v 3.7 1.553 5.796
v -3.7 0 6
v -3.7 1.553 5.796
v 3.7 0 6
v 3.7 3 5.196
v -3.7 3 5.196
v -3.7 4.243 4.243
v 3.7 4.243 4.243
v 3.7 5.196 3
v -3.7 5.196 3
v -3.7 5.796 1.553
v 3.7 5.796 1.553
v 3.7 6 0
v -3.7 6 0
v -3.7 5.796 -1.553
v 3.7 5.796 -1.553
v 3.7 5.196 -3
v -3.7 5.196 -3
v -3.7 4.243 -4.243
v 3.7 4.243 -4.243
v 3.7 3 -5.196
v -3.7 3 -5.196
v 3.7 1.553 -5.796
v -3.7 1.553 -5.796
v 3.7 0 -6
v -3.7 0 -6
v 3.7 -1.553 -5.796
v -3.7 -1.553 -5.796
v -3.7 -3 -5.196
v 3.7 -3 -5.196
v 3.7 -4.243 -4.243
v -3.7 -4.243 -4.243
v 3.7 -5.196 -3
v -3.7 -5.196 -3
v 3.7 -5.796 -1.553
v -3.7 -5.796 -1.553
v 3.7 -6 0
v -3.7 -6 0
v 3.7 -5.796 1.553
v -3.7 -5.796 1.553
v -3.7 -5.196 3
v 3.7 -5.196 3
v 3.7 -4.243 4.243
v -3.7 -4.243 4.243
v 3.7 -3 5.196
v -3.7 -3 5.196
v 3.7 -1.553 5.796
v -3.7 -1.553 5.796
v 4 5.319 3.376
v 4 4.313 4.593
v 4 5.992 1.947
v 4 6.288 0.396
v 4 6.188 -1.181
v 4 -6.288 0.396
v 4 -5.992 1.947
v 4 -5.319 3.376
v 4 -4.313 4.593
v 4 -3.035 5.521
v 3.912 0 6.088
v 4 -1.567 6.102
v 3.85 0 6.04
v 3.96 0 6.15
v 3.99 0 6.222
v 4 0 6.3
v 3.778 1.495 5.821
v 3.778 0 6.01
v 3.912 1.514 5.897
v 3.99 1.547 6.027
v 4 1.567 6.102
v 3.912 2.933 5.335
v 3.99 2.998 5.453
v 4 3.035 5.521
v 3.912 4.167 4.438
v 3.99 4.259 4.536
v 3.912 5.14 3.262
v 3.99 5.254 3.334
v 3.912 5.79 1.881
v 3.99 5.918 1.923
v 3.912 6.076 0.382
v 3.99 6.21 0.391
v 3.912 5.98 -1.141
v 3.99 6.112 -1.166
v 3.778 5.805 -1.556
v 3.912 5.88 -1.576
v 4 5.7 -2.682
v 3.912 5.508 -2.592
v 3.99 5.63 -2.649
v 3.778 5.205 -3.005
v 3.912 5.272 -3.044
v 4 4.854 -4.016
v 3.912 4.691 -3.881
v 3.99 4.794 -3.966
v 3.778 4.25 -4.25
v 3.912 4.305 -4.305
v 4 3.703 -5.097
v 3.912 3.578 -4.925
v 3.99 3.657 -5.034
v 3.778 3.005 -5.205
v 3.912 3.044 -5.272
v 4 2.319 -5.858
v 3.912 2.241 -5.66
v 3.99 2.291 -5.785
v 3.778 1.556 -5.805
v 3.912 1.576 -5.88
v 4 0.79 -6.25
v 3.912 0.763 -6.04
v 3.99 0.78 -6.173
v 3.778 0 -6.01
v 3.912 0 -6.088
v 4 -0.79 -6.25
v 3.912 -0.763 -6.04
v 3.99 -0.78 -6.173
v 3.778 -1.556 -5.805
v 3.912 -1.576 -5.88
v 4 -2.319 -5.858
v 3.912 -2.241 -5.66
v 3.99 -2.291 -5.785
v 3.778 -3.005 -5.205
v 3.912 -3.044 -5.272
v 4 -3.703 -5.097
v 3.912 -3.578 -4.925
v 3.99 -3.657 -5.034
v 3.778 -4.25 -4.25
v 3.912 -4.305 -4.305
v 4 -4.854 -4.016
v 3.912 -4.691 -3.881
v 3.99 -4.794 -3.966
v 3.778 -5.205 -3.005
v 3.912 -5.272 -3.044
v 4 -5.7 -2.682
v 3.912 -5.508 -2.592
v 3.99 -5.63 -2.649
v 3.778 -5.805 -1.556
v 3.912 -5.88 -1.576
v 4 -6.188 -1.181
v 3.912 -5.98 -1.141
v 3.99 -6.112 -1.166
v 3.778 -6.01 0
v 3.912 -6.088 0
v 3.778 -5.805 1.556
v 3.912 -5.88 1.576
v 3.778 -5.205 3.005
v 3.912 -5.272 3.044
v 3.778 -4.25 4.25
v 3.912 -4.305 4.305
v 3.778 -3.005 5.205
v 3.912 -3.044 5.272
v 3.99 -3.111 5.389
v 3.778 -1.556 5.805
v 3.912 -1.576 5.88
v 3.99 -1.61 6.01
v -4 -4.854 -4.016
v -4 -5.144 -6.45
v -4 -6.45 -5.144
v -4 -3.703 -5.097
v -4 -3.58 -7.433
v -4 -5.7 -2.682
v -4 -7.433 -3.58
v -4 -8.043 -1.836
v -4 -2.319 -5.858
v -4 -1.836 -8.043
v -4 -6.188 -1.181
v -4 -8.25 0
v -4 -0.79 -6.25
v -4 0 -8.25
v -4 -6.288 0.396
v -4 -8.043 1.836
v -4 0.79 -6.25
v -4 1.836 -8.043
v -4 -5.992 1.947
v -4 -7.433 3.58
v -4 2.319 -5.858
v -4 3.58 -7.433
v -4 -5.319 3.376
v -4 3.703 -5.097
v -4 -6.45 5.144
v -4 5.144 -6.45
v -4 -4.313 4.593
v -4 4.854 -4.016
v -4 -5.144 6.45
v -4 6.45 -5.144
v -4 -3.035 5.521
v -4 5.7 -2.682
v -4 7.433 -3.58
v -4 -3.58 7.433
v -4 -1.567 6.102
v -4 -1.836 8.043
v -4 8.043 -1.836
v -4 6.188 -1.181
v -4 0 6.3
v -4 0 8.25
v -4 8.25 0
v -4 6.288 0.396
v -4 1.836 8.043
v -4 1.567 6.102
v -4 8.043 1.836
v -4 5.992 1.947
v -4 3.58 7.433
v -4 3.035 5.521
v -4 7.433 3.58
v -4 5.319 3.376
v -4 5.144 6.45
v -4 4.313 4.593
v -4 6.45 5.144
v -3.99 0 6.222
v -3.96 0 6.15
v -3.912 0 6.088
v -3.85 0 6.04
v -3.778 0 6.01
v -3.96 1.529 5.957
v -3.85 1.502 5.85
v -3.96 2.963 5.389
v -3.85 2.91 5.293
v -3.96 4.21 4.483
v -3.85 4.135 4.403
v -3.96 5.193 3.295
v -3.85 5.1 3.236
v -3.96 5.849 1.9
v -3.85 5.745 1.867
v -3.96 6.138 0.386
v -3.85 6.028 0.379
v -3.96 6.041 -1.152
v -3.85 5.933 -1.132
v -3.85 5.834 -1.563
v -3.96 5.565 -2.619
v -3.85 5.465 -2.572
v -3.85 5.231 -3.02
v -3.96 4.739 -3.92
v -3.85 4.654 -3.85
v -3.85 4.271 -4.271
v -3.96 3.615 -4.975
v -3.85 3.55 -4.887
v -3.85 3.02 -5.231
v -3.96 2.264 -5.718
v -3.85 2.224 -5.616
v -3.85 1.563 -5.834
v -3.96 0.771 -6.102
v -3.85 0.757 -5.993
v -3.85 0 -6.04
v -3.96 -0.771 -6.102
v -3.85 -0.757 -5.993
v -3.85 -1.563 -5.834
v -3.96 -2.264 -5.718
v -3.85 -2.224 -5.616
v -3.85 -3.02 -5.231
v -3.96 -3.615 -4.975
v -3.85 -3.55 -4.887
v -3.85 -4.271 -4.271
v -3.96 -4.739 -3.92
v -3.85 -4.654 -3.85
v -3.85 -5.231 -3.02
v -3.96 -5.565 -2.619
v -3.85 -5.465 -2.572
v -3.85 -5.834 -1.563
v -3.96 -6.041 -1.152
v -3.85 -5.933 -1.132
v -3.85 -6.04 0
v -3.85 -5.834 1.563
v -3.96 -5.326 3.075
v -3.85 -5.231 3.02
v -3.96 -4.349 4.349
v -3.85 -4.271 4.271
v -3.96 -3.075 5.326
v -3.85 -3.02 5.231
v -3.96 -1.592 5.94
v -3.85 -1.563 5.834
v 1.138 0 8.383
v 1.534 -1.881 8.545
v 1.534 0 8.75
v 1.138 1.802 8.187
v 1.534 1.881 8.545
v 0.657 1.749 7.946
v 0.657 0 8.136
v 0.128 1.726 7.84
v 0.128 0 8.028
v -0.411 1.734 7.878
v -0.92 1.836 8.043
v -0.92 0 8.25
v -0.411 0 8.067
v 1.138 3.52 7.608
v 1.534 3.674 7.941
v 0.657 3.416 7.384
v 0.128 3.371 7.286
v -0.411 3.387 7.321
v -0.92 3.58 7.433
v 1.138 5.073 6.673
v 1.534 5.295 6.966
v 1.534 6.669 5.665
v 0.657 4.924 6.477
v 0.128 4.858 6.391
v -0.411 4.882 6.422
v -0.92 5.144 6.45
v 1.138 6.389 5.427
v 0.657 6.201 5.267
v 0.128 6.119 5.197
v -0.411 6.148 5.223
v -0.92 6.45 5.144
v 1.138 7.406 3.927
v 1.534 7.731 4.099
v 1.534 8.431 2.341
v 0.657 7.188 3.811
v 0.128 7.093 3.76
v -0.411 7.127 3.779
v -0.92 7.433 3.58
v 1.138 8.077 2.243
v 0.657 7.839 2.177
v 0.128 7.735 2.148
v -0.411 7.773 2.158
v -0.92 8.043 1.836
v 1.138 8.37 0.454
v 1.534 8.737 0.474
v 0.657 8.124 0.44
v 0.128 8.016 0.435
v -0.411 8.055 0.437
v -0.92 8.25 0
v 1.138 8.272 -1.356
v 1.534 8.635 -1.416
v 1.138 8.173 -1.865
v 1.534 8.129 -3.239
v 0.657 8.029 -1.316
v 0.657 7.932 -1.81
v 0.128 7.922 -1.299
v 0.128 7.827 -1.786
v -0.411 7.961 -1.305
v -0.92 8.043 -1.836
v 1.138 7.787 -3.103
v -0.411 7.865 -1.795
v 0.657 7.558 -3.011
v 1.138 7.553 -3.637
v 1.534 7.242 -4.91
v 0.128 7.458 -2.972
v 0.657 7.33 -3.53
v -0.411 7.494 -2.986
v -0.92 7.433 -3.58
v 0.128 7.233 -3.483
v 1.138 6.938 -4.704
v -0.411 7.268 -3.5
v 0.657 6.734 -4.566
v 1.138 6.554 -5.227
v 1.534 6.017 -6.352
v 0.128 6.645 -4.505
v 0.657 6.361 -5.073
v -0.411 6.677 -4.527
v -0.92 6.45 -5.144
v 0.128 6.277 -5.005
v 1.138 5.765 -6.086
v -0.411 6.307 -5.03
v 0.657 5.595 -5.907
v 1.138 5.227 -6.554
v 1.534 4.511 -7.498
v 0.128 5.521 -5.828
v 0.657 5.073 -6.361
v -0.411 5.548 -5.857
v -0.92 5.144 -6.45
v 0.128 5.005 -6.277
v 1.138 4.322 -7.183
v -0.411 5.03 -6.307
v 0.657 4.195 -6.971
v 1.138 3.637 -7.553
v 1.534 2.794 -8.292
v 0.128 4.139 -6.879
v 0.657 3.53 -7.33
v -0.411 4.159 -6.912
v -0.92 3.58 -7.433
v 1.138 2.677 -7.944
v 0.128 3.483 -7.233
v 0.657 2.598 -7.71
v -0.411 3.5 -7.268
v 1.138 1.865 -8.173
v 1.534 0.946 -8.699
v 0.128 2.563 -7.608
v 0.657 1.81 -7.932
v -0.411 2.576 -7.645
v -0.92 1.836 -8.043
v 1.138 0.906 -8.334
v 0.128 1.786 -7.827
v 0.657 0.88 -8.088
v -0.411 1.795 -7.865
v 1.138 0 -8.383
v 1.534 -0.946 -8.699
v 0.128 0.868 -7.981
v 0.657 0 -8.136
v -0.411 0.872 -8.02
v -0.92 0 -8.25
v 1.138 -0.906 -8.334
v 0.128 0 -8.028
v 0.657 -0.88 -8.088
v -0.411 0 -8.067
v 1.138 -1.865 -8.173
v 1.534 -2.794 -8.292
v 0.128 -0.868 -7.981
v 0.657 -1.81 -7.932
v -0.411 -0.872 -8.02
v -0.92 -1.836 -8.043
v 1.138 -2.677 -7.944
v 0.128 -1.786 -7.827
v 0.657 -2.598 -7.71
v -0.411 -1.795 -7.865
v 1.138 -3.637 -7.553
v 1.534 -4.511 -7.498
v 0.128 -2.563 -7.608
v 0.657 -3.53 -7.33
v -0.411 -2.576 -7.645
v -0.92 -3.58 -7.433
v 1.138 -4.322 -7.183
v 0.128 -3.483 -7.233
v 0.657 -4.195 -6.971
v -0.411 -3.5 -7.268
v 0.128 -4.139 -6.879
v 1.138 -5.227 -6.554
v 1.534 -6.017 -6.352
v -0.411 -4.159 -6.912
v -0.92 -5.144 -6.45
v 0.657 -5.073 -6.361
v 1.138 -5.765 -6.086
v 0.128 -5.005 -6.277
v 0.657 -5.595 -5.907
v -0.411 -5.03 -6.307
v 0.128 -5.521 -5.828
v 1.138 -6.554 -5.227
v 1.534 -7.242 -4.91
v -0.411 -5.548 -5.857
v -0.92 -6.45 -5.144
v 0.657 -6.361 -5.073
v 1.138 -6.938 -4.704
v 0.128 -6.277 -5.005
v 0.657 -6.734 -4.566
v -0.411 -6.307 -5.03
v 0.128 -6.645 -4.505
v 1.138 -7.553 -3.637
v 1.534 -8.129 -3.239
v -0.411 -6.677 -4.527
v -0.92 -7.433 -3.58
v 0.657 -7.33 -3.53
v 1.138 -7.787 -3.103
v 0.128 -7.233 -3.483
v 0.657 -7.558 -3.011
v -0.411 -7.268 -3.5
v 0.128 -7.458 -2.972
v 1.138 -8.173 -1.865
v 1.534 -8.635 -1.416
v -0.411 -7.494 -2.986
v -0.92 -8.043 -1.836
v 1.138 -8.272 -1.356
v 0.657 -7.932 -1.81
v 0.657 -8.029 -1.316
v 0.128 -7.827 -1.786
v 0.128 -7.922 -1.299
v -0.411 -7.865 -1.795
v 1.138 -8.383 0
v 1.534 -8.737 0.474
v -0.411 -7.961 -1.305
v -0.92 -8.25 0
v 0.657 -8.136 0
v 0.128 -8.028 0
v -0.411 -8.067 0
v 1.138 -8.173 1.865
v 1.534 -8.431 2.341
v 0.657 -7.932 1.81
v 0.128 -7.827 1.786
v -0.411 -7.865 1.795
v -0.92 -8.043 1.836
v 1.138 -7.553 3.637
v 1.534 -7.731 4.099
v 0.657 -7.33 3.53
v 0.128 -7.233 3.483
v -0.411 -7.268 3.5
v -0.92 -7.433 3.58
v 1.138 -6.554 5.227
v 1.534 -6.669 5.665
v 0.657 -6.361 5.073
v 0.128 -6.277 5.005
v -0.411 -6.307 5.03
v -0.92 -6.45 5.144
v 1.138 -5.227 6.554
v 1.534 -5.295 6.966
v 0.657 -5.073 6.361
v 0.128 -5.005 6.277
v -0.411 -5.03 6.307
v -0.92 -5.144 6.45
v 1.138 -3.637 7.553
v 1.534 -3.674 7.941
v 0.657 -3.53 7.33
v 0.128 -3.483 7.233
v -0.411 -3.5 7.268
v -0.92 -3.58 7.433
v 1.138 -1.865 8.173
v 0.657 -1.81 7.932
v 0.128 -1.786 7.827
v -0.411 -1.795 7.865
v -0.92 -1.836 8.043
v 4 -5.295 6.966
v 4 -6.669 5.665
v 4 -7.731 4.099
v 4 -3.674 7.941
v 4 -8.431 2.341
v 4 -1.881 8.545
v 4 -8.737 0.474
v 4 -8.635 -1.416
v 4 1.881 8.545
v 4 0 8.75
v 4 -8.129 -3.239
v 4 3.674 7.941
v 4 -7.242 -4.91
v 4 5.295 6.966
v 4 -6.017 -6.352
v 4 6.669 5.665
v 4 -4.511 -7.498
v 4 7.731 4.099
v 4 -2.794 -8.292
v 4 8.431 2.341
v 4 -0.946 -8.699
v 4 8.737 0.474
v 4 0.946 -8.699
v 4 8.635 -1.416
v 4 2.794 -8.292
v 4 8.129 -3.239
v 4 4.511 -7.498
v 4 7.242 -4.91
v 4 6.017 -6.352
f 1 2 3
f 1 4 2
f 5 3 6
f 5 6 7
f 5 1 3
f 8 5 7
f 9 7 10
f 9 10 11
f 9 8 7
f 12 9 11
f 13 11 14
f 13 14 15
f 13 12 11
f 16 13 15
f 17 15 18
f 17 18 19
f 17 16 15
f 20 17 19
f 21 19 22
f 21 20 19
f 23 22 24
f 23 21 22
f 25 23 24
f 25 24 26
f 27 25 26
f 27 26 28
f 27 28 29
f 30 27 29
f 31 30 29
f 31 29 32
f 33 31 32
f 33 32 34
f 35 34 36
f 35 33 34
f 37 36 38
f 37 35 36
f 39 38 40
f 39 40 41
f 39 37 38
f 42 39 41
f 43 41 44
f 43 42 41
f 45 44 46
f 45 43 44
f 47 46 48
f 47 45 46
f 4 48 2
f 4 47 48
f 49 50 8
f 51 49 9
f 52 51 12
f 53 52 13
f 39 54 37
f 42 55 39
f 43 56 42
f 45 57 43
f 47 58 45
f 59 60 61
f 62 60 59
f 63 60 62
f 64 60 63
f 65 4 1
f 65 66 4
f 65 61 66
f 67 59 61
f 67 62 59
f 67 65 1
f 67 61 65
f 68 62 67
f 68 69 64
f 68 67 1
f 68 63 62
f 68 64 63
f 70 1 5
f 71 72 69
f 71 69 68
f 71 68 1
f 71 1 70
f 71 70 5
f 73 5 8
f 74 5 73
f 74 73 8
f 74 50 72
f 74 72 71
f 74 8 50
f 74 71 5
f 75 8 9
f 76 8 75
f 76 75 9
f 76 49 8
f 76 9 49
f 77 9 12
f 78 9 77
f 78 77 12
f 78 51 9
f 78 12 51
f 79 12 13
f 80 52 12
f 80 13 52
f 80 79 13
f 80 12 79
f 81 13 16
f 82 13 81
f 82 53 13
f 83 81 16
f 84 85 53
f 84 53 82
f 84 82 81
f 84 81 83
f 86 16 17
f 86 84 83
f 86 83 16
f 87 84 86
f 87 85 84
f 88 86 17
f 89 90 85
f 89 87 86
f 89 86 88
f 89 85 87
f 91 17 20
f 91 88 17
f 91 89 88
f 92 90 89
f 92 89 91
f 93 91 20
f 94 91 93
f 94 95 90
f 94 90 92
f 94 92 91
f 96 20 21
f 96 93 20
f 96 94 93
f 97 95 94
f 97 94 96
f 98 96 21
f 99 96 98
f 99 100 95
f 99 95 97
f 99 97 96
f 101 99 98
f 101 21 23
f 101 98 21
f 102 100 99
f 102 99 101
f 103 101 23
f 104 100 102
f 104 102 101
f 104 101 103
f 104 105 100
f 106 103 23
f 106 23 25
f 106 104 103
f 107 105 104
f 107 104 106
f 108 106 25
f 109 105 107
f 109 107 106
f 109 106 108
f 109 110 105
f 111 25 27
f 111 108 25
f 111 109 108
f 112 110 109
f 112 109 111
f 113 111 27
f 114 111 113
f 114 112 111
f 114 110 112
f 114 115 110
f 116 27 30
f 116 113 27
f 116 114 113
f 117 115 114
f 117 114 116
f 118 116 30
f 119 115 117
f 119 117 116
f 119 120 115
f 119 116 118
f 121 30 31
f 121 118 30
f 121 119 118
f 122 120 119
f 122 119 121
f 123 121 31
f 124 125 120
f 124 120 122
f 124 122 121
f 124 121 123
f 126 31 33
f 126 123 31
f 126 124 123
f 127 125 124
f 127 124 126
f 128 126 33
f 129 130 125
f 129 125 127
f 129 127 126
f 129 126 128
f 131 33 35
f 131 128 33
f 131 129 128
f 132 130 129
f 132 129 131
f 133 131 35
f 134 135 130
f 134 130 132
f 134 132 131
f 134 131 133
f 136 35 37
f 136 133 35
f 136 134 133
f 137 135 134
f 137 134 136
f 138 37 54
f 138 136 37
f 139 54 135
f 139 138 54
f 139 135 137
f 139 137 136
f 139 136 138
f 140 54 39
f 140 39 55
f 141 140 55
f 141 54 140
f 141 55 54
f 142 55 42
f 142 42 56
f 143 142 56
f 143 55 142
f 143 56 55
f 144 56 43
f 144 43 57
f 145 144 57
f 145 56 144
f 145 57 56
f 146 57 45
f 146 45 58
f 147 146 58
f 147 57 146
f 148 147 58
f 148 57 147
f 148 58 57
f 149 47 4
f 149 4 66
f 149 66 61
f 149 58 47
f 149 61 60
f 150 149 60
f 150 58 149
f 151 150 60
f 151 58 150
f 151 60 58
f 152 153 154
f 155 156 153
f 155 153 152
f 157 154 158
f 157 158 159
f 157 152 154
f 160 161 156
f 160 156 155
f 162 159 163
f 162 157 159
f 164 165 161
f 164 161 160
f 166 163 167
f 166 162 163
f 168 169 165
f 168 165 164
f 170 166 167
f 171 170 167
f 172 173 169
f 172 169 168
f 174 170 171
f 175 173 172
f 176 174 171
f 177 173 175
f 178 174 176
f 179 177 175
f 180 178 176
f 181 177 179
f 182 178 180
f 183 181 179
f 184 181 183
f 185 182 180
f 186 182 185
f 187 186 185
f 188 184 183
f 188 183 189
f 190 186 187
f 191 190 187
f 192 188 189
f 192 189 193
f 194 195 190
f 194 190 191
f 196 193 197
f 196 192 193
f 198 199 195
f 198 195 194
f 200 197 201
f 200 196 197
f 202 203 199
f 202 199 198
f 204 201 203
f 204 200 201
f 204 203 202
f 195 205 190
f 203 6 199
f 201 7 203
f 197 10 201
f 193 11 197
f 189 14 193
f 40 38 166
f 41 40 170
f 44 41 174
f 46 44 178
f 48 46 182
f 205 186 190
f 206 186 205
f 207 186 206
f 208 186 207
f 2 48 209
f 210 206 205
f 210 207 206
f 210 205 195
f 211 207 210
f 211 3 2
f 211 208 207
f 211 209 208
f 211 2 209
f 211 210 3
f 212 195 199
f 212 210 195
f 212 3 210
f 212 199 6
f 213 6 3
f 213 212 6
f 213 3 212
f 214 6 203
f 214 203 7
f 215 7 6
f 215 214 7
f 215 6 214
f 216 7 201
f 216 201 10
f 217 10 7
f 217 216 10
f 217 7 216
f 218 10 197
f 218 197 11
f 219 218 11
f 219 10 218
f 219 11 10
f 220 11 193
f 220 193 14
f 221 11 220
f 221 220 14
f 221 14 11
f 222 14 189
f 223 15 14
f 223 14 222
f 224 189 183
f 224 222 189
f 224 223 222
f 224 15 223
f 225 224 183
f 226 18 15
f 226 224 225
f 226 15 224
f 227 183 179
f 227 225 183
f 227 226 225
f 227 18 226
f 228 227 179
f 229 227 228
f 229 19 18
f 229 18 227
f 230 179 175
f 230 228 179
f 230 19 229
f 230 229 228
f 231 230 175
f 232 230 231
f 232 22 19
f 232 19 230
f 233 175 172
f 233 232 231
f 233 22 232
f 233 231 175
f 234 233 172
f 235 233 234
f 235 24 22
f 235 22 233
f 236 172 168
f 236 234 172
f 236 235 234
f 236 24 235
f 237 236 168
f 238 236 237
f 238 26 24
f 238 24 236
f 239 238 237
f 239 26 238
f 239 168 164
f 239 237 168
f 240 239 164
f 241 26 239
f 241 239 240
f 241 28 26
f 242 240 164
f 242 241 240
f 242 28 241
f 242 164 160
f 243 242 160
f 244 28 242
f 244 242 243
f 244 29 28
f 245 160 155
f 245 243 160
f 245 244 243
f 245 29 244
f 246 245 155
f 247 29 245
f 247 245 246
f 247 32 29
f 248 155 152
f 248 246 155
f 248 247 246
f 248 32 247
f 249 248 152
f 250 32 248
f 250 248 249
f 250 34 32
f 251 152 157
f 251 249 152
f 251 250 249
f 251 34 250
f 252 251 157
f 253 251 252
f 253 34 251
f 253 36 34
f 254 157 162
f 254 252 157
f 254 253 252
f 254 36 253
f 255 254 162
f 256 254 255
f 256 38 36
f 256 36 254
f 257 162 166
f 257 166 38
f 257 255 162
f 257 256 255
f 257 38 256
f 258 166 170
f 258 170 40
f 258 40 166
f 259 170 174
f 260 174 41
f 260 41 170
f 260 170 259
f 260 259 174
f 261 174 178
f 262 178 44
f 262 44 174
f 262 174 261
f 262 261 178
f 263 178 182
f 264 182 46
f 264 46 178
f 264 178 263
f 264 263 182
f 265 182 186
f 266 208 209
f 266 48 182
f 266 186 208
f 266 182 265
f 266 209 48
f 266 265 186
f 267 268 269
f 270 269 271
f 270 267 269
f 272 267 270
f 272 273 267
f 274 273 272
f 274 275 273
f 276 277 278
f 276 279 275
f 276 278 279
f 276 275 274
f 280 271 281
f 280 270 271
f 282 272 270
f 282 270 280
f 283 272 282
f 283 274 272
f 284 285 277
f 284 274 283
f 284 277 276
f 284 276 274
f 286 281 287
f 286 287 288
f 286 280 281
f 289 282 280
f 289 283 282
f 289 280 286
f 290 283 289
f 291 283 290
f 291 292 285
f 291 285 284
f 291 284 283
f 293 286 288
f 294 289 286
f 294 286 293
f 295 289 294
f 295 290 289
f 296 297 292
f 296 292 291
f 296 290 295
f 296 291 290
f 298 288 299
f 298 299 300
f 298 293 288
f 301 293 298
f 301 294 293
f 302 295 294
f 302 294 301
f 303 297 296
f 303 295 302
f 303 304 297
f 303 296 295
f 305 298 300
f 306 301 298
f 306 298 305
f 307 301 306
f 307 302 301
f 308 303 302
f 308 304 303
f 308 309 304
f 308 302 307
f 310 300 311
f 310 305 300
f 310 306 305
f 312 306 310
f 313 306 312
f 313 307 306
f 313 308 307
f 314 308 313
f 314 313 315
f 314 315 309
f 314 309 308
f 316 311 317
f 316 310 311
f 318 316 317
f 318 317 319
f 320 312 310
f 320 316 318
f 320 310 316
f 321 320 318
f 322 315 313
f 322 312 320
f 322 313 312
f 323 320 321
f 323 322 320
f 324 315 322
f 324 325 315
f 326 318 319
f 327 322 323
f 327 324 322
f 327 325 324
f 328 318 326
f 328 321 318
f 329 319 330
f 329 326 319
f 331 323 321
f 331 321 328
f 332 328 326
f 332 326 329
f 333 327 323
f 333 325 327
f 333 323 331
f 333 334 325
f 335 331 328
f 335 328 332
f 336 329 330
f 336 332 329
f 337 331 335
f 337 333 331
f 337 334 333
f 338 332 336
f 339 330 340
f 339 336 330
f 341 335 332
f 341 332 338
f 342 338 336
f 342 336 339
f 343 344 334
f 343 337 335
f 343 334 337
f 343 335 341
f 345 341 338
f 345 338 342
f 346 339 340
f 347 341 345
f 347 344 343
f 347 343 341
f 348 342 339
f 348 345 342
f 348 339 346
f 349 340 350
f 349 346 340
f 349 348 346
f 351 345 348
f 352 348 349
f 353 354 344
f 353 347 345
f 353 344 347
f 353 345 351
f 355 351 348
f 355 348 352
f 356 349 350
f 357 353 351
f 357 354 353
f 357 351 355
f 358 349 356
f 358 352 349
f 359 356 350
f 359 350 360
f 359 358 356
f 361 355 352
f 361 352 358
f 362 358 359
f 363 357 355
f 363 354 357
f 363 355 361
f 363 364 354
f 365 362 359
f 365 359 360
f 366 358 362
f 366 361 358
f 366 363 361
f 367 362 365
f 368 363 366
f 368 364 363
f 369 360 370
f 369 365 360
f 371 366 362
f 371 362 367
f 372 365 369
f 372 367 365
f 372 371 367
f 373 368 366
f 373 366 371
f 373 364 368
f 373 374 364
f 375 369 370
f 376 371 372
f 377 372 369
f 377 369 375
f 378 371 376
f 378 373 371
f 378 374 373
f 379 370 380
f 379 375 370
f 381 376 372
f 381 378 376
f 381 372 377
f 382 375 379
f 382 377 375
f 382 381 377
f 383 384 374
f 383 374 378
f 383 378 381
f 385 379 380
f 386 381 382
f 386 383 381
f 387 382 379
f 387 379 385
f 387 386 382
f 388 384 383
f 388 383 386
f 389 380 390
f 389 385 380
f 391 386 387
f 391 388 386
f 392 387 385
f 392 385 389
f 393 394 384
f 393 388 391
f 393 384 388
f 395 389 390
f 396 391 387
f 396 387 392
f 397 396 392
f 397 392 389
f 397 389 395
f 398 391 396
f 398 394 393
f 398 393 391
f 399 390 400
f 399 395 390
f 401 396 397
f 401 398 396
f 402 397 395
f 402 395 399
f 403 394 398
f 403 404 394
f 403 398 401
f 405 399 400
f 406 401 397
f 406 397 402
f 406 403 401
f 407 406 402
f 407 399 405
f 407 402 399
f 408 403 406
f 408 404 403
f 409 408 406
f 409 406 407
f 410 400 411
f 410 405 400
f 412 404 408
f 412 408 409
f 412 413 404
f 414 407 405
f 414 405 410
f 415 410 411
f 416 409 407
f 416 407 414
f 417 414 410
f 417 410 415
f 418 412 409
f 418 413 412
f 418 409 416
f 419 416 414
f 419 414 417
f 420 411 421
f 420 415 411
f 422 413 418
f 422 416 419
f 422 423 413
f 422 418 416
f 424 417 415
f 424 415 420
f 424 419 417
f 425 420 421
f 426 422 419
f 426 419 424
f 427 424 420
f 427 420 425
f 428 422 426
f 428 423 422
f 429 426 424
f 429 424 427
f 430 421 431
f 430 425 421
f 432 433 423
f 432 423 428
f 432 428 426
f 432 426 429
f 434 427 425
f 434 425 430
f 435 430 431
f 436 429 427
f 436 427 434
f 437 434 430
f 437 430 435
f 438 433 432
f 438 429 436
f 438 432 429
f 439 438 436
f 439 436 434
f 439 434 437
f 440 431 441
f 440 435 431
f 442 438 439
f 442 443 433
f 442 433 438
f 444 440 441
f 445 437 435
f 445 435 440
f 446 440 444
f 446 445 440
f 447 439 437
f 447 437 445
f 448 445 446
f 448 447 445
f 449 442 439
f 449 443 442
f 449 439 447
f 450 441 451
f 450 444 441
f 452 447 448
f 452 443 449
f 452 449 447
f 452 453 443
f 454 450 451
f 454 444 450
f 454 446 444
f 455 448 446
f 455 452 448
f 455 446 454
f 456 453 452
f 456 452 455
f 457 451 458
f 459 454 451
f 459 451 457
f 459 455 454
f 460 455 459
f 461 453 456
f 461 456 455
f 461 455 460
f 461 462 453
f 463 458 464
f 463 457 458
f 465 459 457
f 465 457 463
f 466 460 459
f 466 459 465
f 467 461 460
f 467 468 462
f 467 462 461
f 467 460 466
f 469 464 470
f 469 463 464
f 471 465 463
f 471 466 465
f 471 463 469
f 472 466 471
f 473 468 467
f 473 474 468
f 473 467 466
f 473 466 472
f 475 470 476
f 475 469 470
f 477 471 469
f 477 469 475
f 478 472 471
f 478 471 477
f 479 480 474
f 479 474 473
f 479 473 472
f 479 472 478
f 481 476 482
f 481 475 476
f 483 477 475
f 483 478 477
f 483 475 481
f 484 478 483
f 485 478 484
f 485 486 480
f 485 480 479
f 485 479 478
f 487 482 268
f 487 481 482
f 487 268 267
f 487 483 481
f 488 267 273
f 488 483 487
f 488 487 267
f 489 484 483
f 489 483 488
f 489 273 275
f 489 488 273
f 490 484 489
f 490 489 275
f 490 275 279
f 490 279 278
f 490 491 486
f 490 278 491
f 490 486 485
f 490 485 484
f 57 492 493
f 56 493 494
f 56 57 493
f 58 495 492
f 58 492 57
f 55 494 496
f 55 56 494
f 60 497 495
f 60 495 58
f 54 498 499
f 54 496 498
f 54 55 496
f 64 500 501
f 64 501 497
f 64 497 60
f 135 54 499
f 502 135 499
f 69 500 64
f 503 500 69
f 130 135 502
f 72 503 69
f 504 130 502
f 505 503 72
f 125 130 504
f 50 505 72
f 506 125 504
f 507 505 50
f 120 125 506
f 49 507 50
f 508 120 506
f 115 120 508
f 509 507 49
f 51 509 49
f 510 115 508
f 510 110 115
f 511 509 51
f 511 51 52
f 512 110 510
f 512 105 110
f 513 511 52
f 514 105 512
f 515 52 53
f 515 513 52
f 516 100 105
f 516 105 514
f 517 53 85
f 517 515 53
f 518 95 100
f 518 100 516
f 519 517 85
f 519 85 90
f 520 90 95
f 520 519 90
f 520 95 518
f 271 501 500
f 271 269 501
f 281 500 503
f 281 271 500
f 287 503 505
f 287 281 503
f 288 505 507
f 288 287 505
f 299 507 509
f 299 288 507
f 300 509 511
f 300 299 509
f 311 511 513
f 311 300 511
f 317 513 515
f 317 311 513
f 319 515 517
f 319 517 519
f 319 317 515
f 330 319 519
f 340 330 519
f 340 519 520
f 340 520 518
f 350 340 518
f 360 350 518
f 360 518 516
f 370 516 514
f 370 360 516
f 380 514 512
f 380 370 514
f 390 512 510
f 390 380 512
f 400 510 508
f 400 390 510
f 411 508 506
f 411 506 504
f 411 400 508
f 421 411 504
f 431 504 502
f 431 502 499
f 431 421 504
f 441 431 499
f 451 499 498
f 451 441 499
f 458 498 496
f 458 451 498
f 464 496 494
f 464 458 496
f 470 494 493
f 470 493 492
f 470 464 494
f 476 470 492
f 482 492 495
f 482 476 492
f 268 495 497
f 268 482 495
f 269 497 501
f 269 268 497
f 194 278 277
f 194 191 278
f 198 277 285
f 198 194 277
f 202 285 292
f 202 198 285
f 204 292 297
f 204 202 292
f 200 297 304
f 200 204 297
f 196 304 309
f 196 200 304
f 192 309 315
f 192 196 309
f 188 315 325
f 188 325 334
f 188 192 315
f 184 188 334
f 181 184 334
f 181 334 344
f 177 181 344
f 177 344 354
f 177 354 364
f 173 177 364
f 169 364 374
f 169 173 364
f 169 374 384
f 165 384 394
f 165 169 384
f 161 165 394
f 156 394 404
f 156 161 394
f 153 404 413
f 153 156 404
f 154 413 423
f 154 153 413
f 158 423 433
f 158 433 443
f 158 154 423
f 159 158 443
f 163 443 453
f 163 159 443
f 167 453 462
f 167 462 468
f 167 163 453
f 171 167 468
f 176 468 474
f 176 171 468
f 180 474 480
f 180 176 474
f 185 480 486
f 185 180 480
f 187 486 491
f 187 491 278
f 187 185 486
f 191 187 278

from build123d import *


with BuildPart() as part:
    # Sketch1 → Revolve1 (revolve)
    with BuildSketch(Plane.XY, mode=Mode.PRIVATE) as revolve1_sk:
        with BuildLine():
            Line((-3.7, 6), (3.7, 6))
            ThreePointArc((3.7, 6), (3.912132034, 6.087867966), (4, 6.3))
            Line((4, 6.3), (4, 8.75))
            Line((4, 8.75), (1.534411288, 8.75))
            ThreePointArc((1.534411288, 8.75), (0.396176489, 8.063947496), (-0.919738006, 8.25))
            Line((-0.919738006, 8.25), (-4, 8.25))
            Line((-4, 8.25), (-4, 6.3))
            ThreePointArc((-4, 6.3), (-3.912132034, 6.087867966), (-3.7, 6))
        make_face()
    revolve(revolve1_sk.sketch.rotate(Axis((4, 0, 0), (-1, 0, 0)), 270), axis=Axis((4, 0, 0), (-1, 0, 0)))


solid = part.part
